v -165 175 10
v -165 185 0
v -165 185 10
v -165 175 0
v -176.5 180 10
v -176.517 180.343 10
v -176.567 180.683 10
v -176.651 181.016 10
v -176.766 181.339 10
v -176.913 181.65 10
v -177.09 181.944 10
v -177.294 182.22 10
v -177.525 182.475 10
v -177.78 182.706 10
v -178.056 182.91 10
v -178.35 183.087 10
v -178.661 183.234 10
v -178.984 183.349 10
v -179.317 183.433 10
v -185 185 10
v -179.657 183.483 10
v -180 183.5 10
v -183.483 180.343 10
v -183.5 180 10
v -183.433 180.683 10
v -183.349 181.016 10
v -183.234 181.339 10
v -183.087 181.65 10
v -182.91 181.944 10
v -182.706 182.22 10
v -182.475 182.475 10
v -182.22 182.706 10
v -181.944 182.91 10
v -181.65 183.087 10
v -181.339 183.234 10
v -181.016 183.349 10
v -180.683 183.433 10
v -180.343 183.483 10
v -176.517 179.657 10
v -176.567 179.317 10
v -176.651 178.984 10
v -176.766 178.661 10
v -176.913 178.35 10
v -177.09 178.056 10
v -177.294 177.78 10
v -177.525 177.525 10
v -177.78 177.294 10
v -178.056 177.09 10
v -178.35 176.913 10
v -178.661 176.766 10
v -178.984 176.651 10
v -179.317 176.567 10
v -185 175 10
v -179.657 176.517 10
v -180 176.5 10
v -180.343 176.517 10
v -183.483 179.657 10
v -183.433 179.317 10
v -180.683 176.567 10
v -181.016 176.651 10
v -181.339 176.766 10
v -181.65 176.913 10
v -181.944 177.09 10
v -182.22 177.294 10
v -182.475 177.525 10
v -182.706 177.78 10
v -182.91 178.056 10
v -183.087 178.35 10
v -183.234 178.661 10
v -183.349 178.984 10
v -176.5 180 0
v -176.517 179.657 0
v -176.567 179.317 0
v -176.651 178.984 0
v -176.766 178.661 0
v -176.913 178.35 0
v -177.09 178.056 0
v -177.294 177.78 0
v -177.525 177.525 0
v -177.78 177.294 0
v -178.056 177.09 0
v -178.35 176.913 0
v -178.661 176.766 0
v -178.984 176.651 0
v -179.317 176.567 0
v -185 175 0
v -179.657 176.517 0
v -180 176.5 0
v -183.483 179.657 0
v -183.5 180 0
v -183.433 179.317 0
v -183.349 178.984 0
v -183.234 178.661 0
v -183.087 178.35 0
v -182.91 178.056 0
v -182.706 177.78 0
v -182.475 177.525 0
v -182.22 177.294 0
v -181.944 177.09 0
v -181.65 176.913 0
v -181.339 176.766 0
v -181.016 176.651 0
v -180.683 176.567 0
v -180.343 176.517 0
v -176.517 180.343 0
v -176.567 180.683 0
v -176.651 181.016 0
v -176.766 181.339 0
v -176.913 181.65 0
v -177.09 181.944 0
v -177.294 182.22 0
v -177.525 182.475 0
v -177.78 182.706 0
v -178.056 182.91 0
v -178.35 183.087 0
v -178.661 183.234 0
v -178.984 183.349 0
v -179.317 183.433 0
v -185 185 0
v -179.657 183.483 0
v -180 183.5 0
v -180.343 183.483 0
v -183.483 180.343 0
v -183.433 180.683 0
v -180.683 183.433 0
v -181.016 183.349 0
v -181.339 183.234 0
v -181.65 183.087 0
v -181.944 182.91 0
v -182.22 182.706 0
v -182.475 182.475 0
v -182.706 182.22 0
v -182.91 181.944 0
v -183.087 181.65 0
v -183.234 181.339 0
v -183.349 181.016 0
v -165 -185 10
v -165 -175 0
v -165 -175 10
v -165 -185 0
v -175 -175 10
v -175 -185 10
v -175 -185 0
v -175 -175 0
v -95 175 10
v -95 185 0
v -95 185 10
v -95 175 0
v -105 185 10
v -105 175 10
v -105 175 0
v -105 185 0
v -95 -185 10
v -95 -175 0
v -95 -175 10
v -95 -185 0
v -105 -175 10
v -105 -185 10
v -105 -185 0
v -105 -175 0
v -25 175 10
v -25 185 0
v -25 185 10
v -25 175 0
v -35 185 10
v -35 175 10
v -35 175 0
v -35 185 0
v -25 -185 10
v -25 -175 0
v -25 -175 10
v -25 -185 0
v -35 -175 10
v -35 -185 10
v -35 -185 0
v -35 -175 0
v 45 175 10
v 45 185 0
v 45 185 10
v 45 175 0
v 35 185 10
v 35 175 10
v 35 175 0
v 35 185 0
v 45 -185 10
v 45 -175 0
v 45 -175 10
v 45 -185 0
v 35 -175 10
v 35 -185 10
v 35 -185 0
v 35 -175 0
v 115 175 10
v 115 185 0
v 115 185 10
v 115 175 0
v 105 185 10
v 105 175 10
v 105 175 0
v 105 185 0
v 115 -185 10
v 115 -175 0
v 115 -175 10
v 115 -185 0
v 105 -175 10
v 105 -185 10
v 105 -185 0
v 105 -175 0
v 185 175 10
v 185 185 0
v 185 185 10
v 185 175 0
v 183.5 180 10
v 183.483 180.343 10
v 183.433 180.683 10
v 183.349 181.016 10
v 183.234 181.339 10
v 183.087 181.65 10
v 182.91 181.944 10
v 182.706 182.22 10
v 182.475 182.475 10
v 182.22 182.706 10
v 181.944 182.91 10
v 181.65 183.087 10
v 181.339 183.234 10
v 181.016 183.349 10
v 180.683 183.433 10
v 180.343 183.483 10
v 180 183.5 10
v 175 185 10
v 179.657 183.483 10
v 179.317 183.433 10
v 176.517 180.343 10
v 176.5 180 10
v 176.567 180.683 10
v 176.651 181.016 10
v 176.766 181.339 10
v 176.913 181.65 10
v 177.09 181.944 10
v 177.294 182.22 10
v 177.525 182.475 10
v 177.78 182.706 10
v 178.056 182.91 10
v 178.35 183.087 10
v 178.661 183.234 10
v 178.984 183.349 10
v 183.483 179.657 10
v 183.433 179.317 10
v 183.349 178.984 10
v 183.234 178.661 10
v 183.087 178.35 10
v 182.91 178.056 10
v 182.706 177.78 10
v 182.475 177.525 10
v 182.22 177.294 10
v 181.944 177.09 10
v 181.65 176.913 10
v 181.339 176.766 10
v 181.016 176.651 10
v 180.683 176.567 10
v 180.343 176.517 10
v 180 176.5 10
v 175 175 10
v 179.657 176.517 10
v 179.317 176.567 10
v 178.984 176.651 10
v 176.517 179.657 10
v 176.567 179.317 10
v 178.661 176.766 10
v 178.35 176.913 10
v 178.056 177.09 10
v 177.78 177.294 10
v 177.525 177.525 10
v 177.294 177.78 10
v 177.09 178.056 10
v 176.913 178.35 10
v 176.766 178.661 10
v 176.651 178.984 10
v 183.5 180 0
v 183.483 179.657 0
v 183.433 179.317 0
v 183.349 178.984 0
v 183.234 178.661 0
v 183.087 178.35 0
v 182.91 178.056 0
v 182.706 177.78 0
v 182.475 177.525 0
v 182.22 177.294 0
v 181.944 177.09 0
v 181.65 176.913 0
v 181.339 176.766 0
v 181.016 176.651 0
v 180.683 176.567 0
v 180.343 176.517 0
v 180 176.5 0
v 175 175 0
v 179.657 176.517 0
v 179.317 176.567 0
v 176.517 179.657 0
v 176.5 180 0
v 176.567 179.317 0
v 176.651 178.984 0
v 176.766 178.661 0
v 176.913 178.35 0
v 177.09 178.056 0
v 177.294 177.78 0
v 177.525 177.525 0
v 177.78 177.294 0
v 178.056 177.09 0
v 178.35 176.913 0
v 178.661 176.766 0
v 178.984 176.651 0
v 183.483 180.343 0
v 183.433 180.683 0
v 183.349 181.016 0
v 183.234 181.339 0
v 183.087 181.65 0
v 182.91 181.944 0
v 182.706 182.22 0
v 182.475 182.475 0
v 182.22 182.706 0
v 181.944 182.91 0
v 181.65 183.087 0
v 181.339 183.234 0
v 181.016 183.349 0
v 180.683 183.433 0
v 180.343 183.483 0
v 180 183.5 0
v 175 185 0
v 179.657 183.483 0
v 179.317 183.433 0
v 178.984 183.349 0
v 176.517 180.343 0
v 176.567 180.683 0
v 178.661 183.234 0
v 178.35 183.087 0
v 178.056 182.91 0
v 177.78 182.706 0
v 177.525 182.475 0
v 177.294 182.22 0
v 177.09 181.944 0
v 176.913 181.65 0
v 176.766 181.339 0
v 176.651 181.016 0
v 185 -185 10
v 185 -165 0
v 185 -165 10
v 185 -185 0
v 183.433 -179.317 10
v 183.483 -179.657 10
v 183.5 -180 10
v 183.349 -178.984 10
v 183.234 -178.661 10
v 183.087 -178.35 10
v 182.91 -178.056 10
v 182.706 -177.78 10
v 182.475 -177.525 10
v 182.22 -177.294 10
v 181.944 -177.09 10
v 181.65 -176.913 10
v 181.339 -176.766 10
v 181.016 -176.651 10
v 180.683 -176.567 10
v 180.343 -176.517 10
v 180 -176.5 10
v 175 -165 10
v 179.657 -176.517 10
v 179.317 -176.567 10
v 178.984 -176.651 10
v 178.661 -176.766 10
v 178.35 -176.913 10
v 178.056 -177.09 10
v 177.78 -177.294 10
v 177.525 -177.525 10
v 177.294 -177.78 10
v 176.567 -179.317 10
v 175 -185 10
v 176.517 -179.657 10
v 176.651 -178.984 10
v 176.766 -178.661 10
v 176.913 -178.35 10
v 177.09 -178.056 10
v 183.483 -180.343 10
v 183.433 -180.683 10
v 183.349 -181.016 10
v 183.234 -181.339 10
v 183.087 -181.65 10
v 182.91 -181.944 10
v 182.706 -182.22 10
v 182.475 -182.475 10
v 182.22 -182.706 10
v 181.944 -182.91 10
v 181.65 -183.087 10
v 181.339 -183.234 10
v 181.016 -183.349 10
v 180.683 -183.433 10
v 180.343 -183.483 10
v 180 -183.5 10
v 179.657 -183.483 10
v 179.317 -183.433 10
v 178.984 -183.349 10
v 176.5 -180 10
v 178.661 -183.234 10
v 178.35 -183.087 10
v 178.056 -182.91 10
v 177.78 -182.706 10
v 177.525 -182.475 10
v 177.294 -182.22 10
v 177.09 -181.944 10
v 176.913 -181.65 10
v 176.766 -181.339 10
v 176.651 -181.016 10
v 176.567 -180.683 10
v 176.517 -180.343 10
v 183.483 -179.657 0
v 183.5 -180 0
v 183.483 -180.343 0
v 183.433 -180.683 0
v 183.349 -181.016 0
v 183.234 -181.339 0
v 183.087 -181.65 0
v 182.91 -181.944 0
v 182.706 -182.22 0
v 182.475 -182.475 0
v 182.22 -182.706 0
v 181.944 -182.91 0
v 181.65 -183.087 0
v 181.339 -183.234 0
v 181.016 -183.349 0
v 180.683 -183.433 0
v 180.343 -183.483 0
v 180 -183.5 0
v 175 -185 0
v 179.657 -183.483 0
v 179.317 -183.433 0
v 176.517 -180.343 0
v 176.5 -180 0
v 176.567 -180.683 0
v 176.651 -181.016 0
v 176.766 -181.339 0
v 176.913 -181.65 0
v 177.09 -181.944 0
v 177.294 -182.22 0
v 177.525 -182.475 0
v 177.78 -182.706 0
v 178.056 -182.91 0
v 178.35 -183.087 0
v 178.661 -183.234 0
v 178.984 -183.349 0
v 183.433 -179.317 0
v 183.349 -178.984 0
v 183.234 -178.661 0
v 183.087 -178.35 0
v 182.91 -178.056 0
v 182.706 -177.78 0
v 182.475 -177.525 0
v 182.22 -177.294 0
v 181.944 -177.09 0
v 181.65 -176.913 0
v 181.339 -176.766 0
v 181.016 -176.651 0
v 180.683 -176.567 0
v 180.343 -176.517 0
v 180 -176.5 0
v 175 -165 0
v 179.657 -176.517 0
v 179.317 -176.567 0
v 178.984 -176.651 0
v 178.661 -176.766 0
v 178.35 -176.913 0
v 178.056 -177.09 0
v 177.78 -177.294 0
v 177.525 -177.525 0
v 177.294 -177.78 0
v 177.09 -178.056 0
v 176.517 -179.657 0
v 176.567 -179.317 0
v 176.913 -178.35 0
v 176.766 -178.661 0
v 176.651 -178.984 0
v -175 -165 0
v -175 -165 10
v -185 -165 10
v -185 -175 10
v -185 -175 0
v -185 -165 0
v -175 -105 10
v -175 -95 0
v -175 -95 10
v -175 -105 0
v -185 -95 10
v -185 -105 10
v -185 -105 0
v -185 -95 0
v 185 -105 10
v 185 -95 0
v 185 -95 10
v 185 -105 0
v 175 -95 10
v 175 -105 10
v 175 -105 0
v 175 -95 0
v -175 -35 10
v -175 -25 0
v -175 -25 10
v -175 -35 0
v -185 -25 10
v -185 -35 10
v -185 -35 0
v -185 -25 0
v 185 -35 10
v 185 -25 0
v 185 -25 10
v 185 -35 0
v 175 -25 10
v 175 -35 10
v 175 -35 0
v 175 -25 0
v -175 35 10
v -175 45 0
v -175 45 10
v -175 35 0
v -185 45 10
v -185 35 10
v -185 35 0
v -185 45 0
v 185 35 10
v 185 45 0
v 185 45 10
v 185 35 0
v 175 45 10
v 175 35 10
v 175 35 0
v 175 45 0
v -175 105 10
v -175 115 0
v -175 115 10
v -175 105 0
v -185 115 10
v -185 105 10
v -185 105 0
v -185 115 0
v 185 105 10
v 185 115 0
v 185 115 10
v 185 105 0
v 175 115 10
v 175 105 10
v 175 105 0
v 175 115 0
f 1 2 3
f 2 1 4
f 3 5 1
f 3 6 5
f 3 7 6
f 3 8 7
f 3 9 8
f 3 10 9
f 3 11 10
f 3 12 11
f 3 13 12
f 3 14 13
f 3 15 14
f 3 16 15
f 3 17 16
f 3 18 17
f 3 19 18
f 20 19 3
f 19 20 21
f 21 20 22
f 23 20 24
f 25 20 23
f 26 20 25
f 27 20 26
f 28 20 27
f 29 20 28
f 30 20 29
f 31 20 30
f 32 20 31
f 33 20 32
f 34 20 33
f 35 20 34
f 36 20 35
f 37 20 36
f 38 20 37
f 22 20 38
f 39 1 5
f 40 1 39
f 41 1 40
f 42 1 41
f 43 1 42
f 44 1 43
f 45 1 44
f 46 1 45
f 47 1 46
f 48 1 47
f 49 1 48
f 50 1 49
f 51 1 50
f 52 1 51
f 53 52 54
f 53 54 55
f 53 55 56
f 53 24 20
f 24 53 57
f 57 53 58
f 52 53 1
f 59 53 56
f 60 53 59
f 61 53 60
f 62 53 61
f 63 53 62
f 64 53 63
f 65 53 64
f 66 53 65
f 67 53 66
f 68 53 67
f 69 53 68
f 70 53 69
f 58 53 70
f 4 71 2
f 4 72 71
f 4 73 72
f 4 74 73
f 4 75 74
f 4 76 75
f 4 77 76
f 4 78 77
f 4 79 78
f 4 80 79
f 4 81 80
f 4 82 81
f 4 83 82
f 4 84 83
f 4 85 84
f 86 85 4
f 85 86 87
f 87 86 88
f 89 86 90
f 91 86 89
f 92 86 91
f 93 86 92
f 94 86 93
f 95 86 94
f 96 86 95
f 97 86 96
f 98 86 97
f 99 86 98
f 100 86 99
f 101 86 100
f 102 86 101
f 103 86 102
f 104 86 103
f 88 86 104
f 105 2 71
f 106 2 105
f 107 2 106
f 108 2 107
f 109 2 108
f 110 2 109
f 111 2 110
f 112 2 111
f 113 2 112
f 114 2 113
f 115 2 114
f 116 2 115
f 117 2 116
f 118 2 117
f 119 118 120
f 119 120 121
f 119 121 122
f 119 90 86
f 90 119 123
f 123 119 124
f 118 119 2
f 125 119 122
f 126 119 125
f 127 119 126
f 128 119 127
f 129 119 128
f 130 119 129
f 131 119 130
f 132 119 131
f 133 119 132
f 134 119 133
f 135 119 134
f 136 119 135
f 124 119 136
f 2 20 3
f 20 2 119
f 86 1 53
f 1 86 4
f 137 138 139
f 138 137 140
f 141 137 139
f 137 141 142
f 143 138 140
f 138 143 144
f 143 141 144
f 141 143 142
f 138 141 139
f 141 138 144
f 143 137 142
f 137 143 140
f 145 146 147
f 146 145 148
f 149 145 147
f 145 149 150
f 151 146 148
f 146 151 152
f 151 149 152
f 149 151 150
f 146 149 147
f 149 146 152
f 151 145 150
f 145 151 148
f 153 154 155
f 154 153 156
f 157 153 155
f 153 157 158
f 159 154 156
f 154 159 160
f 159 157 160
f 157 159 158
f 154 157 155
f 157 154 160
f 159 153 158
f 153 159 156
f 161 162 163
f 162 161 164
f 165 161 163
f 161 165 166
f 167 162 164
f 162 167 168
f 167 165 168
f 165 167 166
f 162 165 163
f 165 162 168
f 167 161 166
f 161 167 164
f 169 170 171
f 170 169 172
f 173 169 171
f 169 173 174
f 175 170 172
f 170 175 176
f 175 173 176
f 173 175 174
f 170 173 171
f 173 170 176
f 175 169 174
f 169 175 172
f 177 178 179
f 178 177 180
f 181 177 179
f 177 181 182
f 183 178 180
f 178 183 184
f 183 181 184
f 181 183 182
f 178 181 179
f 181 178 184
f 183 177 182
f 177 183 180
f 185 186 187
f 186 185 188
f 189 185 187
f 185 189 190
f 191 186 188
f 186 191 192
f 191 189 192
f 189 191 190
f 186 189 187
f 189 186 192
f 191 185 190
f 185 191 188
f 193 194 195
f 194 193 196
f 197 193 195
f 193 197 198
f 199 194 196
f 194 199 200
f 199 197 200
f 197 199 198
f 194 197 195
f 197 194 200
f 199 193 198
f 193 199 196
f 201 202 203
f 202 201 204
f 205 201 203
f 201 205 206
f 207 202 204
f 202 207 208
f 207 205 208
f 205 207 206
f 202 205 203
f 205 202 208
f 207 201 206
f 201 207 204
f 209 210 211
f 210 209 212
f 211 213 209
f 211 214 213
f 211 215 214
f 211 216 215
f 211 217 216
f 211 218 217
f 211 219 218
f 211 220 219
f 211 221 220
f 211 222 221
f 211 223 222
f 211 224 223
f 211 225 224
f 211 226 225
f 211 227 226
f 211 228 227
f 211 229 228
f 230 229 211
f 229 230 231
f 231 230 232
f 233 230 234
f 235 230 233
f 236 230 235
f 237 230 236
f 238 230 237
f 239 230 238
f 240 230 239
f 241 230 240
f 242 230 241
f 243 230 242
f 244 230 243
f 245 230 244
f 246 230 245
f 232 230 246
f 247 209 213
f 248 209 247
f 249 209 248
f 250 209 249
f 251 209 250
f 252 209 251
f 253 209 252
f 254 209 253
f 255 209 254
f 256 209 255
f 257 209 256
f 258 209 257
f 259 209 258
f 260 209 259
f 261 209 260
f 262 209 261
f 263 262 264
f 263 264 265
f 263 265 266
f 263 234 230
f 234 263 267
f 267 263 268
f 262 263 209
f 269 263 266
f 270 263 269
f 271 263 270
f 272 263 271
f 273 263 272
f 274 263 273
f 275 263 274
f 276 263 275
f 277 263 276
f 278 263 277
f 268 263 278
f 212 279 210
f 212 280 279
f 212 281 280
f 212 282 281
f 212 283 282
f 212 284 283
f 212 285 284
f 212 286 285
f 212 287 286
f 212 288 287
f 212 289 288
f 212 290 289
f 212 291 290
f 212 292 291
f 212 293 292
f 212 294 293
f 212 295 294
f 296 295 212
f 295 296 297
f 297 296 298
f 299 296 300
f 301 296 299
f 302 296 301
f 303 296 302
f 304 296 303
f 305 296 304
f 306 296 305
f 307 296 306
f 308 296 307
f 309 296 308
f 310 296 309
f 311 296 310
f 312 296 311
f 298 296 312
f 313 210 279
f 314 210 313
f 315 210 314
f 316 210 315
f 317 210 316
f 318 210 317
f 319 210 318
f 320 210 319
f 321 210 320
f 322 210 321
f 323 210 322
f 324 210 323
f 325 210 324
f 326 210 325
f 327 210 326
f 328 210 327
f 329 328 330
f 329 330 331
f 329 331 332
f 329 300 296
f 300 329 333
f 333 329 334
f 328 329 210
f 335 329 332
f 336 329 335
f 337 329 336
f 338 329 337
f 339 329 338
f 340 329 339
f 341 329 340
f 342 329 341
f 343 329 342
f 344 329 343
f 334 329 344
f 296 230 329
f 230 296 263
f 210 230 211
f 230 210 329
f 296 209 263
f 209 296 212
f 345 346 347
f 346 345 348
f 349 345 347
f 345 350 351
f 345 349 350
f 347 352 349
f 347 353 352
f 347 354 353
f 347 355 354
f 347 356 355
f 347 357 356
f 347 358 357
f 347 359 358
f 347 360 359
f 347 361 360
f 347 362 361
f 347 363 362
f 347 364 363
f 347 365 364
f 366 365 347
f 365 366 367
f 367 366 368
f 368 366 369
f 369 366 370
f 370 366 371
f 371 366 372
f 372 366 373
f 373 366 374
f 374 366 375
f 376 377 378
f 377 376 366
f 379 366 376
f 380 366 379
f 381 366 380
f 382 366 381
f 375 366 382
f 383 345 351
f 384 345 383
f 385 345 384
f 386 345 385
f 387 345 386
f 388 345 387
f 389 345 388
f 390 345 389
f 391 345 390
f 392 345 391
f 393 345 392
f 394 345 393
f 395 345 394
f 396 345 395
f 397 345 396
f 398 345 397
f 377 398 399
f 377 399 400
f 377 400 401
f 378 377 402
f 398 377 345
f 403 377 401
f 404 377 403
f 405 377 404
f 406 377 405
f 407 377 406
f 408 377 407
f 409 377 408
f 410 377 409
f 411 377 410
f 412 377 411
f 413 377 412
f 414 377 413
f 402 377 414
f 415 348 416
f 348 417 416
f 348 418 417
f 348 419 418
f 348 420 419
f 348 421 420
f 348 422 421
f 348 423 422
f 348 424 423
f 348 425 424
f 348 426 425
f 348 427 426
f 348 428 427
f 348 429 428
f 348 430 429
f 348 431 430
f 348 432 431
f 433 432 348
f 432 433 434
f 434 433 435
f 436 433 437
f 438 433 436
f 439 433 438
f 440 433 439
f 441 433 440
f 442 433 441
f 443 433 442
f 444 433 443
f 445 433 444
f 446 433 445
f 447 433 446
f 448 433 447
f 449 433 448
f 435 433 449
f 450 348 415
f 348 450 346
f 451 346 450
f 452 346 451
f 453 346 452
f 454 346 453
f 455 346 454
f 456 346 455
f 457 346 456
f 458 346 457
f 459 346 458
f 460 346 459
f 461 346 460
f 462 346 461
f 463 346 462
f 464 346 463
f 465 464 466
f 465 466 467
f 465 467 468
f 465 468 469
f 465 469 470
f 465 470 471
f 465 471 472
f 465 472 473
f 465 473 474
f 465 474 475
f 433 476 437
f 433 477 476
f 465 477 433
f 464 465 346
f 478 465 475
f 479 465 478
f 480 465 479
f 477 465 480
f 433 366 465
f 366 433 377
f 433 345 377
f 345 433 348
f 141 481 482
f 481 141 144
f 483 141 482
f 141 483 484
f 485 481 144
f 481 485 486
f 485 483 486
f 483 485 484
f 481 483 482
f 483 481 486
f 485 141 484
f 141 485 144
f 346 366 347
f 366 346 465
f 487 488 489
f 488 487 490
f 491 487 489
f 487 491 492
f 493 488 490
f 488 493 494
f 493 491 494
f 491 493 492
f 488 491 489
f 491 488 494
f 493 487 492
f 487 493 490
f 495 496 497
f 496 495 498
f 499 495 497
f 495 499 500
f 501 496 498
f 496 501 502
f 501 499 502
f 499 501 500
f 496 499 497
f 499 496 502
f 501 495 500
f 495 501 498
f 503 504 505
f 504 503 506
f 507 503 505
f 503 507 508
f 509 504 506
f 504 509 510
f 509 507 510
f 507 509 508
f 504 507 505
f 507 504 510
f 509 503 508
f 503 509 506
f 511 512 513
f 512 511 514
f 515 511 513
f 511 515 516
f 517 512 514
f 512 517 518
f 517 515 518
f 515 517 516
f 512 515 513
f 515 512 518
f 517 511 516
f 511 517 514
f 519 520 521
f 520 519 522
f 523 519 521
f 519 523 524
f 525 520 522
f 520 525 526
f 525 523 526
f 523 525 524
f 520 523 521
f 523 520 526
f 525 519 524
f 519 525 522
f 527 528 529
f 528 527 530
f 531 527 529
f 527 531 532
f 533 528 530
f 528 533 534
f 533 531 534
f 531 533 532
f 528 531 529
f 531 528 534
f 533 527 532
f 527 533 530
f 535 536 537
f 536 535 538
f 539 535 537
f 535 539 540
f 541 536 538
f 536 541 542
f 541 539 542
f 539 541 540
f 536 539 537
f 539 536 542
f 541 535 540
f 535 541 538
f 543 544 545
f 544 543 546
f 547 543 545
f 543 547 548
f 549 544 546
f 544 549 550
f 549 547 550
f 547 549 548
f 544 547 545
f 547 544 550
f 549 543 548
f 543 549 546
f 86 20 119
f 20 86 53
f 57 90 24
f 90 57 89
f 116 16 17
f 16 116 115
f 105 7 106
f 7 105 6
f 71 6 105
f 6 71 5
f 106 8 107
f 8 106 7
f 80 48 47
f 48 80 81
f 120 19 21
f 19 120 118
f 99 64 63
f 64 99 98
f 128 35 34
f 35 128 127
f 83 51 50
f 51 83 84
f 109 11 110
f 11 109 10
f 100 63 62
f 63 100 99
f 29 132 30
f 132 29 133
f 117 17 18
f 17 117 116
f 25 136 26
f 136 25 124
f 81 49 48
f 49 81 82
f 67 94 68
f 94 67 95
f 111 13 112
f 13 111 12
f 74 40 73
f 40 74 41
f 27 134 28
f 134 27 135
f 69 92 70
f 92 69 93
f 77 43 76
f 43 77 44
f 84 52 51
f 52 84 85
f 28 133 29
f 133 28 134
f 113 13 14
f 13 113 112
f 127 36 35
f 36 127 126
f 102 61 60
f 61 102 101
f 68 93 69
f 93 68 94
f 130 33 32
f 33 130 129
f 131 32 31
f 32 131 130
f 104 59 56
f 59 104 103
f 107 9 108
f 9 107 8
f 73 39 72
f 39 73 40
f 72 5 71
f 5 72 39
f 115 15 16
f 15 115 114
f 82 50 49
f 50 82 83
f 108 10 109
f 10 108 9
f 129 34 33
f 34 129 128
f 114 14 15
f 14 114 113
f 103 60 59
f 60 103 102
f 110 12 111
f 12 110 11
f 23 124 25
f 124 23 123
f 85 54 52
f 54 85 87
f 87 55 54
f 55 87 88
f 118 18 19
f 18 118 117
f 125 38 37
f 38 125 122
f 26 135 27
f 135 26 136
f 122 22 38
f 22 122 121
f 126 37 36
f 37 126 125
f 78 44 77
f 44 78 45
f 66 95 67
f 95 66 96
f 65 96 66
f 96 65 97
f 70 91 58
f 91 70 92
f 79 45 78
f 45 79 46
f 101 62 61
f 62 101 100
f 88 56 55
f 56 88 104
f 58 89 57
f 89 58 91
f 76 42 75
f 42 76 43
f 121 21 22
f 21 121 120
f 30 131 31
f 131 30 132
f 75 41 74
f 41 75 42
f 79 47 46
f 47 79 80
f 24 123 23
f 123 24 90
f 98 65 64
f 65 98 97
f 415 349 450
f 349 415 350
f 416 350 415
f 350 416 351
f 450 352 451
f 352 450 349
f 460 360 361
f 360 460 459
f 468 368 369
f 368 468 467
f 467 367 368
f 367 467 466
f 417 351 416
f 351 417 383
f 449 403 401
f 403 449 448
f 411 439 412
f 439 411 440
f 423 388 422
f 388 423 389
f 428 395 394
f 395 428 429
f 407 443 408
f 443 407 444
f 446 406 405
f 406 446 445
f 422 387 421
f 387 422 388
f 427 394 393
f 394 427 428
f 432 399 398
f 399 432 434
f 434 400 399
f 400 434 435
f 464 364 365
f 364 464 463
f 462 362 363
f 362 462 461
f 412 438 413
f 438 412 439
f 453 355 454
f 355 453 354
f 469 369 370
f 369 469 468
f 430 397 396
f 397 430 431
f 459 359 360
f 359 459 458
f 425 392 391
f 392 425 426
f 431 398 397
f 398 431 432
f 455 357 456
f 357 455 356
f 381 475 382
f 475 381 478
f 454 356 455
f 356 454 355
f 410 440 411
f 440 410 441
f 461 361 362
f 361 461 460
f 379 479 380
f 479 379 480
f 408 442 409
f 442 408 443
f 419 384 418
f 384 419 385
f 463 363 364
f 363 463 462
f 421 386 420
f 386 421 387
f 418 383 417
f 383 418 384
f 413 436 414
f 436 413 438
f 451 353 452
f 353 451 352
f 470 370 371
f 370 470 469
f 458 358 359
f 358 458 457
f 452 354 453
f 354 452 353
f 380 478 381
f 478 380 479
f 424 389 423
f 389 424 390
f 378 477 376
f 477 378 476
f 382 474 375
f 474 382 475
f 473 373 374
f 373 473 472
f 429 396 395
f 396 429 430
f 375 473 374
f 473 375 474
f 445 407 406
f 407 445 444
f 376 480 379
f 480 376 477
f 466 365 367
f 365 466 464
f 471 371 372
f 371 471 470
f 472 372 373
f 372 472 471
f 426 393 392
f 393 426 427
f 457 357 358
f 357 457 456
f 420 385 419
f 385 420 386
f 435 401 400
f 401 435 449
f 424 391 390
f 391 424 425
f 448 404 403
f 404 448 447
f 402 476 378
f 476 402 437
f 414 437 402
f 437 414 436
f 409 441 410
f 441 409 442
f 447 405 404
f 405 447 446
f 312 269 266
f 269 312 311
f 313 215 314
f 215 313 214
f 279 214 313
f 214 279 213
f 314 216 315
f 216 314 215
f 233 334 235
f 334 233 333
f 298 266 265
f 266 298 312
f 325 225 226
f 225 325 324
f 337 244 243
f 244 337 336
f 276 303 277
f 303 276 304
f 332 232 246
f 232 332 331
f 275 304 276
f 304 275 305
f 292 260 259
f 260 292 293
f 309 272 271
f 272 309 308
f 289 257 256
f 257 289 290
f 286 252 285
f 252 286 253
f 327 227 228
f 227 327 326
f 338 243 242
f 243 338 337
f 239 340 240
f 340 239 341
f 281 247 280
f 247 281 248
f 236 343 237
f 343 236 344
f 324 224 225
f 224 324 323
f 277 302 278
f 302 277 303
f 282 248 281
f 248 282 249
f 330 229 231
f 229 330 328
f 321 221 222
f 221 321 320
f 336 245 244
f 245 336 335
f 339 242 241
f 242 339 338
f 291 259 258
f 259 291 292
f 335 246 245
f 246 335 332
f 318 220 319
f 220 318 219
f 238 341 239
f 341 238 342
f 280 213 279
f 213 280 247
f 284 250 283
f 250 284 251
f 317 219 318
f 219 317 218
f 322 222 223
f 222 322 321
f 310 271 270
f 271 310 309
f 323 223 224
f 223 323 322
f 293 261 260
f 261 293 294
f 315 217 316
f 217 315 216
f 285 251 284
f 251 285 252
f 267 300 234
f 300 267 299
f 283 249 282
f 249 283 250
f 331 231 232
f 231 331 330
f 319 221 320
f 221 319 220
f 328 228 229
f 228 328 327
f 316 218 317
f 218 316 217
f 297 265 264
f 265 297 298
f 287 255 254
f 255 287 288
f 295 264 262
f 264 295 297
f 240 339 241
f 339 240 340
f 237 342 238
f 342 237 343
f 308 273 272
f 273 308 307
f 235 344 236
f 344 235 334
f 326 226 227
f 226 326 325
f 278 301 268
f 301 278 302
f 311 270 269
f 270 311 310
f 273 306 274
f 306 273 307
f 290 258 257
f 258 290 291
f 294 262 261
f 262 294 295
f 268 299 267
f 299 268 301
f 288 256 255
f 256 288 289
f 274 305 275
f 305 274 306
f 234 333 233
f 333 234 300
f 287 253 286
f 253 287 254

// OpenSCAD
// ring_63.scad - ring index 63 (z bottom = 630 mm)
$fn = 64; bar = 10; half_b = bar/2; outer = 370; half_outer = outer/2;
front_y = 180; back_y = -180; left_x = -180; right_x = 180;
x_centers = [-170, -100, -30, 40, 110, 180];
z_centers = [5, 85, 155, 225, 295, 365, 435, 505, 575, 645, 715]; ring_z = 630;
module place_box(cx, cy, sx, sy) { translate([cx - sx/2, cy - sy/2, 0]) cube([sx, sy, bar]); }

difference() { union() {
    for (x = x_centers) { place_box(x, front_y, bar, bar); place_box(x, back_y, bar, bar); }
    for (y = x_centers) { place_box(left_x, y, bar, bar); place_box(right_x, y, bar, bar); }
    for (zc = z_centers) if ((zc - half_b < ring_z + bar) && (zc + half_b > ring_z)) {
        translate([-half_outer, front_y - half_b, 0]) cube([outer, bar, bar]);
        translate([-half_outer, back_y - half_b, 0])  cube([outer, bar, bar]);
        translate([left_x - half_b, -half_outer, 0])  cube([bar, outer, bar]);
        translate([right_x - half_b, -half_outer, 0]) cube([bar, outer, bar]);
    }
  }
  for (cx = [-180, 180]) for (cy = [-180, 180]) translate([cx, cy, 0]) cylinder(h = bar, r = 3.5, $fn = 64);
}
